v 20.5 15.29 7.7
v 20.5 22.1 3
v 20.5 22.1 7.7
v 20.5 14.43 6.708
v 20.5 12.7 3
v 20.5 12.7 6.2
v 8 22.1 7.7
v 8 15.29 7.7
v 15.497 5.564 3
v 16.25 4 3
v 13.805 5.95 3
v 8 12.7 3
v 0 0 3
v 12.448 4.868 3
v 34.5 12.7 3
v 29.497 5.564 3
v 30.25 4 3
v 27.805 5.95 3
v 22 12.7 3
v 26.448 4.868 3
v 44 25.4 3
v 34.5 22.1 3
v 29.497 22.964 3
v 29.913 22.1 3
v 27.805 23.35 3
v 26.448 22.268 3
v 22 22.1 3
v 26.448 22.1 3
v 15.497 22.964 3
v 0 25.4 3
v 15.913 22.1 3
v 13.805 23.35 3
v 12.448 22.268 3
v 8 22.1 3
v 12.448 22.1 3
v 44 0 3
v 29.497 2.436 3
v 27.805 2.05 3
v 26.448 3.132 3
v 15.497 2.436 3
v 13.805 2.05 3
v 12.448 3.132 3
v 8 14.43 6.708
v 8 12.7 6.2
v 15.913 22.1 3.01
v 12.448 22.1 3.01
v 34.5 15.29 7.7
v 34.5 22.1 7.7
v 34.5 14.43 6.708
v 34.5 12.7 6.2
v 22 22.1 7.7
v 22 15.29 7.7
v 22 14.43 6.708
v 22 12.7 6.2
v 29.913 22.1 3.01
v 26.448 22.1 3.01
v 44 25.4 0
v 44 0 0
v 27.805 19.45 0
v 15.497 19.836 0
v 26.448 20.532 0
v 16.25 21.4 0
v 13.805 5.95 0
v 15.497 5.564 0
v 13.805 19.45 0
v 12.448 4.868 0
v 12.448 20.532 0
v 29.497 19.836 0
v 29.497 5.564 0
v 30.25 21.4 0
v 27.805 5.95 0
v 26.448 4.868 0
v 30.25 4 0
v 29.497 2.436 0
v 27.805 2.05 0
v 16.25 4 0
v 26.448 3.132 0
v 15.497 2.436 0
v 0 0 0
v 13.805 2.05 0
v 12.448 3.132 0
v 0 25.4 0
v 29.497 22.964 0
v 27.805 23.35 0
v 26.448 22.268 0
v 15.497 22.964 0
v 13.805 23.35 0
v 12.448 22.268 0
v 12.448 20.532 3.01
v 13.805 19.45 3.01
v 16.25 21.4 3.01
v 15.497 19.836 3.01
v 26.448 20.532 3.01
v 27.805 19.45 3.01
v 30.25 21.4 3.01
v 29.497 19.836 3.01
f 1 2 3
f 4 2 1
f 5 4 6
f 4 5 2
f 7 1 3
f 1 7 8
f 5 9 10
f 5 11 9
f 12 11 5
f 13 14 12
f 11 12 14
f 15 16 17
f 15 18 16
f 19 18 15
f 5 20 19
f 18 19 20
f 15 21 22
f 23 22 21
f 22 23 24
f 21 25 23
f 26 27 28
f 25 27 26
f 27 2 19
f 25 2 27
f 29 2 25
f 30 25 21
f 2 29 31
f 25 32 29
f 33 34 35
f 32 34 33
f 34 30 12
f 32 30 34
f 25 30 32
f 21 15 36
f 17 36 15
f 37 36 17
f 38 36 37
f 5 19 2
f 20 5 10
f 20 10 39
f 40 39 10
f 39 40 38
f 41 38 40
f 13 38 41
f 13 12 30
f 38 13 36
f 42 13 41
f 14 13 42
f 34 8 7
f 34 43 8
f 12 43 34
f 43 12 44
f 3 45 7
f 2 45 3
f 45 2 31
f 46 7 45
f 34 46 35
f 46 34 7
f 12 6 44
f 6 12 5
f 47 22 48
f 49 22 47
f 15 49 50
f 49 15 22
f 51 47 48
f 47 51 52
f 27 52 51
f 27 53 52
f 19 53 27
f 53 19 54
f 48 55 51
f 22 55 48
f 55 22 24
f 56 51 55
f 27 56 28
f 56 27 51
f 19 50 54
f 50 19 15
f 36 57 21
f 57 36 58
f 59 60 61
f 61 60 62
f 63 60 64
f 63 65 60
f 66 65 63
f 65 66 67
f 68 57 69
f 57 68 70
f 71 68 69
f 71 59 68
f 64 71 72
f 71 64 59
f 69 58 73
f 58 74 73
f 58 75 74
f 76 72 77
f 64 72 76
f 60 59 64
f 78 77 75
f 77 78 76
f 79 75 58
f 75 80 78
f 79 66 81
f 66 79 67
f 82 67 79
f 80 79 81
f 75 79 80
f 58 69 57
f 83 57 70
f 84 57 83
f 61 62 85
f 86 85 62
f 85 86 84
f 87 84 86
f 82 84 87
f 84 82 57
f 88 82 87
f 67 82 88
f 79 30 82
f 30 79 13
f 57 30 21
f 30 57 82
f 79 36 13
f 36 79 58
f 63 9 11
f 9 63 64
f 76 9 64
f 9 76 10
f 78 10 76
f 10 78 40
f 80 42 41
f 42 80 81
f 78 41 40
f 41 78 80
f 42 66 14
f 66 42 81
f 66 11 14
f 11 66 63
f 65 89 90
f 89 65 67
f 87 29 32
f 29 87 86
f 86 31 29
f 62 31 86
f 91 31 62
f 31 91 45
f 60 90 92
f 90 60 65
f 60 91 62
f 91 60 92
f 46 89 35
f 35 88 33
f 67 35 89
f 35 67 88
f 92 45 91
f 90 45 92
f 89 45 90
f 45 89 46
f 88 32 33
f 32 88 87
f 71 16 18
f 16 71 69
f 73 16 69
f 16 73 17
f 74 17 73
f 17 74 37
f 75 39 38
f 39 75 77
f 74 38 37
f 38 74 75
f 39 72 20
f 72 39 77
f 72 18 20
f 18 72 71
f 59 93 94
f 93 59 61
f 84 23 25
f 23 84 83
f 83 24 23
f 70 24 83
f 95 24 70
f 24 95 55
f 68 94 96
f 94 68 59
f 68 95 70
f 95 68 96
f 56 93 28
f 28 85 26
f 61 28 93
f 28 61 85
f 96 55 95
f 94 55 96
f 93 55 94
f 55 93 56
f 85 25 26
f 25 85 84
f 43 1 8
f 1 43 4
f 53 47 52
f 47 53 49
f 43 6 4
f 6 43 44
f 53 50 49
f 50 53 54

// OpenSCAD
// orcad: screw-down clip run that holds a row of round cables against a wall or panel.
cable_diameter = 6;
clip_count = 2;
clip_pitch = 14;
base_thickness = 3;
base_margin = 8;
web_thickness = 1.5;
clip_height = 0;
open_top = true;
mount_hole_diameter = 4;

channel_diameter = cable_diameter + 0.4;
// An open clip cradles half the cable, a closed one snaps a full ring around it.
clip_body_height = clip_height > 0 ? clip_height :
    (open_top ? channel_diameter / 2 : channel_diameter) + web_thickness;
clip_body_width = channel_diameter + 2 * web_thickness;
clip_width = max(clip_pitch - web_thickness, channel_diameter + 1);
base_x = clip_count * clip_pitch + 2 * base_margin;
base_y = max(clip_body_height, clip_body_width) + 2 * base_margin;
channel_z = base_thickness + channel_diameter / 2;

difference() {
    union() {
        cube([base_x, base_y, base_thickness]);
        for (i = [0 : clip_count - 1])
            translate([base_margin + i * clip_pitch, base_y / 2, base_thickness])
                cube([clip_width, clip_body_width, clip_body_height]);
    }

    translate([base_x / 2 - 5, base_y / 2, channel_z + (open_top ? channel_diameter / 2 : 0)])
        rotate([0, 90, 0])
            cylinder(h = base_x + 10, d = channel_diameter, center = true);

    // Screw holes sit in front of and behind the cables so the heads stay clear.
    for (i = [0 : clip_count - 1], y = [-1, 1])
        translate([base_margin + i * clip_pitch + clip_width / 2,
                   base_y / 2 + y * (max(clip_body_height, clip_body_width) / 2 + base_margin / 2), -0.01])
            cylinder(d = mount_hole_diameter, h = base_thickness + 0.02);
}
